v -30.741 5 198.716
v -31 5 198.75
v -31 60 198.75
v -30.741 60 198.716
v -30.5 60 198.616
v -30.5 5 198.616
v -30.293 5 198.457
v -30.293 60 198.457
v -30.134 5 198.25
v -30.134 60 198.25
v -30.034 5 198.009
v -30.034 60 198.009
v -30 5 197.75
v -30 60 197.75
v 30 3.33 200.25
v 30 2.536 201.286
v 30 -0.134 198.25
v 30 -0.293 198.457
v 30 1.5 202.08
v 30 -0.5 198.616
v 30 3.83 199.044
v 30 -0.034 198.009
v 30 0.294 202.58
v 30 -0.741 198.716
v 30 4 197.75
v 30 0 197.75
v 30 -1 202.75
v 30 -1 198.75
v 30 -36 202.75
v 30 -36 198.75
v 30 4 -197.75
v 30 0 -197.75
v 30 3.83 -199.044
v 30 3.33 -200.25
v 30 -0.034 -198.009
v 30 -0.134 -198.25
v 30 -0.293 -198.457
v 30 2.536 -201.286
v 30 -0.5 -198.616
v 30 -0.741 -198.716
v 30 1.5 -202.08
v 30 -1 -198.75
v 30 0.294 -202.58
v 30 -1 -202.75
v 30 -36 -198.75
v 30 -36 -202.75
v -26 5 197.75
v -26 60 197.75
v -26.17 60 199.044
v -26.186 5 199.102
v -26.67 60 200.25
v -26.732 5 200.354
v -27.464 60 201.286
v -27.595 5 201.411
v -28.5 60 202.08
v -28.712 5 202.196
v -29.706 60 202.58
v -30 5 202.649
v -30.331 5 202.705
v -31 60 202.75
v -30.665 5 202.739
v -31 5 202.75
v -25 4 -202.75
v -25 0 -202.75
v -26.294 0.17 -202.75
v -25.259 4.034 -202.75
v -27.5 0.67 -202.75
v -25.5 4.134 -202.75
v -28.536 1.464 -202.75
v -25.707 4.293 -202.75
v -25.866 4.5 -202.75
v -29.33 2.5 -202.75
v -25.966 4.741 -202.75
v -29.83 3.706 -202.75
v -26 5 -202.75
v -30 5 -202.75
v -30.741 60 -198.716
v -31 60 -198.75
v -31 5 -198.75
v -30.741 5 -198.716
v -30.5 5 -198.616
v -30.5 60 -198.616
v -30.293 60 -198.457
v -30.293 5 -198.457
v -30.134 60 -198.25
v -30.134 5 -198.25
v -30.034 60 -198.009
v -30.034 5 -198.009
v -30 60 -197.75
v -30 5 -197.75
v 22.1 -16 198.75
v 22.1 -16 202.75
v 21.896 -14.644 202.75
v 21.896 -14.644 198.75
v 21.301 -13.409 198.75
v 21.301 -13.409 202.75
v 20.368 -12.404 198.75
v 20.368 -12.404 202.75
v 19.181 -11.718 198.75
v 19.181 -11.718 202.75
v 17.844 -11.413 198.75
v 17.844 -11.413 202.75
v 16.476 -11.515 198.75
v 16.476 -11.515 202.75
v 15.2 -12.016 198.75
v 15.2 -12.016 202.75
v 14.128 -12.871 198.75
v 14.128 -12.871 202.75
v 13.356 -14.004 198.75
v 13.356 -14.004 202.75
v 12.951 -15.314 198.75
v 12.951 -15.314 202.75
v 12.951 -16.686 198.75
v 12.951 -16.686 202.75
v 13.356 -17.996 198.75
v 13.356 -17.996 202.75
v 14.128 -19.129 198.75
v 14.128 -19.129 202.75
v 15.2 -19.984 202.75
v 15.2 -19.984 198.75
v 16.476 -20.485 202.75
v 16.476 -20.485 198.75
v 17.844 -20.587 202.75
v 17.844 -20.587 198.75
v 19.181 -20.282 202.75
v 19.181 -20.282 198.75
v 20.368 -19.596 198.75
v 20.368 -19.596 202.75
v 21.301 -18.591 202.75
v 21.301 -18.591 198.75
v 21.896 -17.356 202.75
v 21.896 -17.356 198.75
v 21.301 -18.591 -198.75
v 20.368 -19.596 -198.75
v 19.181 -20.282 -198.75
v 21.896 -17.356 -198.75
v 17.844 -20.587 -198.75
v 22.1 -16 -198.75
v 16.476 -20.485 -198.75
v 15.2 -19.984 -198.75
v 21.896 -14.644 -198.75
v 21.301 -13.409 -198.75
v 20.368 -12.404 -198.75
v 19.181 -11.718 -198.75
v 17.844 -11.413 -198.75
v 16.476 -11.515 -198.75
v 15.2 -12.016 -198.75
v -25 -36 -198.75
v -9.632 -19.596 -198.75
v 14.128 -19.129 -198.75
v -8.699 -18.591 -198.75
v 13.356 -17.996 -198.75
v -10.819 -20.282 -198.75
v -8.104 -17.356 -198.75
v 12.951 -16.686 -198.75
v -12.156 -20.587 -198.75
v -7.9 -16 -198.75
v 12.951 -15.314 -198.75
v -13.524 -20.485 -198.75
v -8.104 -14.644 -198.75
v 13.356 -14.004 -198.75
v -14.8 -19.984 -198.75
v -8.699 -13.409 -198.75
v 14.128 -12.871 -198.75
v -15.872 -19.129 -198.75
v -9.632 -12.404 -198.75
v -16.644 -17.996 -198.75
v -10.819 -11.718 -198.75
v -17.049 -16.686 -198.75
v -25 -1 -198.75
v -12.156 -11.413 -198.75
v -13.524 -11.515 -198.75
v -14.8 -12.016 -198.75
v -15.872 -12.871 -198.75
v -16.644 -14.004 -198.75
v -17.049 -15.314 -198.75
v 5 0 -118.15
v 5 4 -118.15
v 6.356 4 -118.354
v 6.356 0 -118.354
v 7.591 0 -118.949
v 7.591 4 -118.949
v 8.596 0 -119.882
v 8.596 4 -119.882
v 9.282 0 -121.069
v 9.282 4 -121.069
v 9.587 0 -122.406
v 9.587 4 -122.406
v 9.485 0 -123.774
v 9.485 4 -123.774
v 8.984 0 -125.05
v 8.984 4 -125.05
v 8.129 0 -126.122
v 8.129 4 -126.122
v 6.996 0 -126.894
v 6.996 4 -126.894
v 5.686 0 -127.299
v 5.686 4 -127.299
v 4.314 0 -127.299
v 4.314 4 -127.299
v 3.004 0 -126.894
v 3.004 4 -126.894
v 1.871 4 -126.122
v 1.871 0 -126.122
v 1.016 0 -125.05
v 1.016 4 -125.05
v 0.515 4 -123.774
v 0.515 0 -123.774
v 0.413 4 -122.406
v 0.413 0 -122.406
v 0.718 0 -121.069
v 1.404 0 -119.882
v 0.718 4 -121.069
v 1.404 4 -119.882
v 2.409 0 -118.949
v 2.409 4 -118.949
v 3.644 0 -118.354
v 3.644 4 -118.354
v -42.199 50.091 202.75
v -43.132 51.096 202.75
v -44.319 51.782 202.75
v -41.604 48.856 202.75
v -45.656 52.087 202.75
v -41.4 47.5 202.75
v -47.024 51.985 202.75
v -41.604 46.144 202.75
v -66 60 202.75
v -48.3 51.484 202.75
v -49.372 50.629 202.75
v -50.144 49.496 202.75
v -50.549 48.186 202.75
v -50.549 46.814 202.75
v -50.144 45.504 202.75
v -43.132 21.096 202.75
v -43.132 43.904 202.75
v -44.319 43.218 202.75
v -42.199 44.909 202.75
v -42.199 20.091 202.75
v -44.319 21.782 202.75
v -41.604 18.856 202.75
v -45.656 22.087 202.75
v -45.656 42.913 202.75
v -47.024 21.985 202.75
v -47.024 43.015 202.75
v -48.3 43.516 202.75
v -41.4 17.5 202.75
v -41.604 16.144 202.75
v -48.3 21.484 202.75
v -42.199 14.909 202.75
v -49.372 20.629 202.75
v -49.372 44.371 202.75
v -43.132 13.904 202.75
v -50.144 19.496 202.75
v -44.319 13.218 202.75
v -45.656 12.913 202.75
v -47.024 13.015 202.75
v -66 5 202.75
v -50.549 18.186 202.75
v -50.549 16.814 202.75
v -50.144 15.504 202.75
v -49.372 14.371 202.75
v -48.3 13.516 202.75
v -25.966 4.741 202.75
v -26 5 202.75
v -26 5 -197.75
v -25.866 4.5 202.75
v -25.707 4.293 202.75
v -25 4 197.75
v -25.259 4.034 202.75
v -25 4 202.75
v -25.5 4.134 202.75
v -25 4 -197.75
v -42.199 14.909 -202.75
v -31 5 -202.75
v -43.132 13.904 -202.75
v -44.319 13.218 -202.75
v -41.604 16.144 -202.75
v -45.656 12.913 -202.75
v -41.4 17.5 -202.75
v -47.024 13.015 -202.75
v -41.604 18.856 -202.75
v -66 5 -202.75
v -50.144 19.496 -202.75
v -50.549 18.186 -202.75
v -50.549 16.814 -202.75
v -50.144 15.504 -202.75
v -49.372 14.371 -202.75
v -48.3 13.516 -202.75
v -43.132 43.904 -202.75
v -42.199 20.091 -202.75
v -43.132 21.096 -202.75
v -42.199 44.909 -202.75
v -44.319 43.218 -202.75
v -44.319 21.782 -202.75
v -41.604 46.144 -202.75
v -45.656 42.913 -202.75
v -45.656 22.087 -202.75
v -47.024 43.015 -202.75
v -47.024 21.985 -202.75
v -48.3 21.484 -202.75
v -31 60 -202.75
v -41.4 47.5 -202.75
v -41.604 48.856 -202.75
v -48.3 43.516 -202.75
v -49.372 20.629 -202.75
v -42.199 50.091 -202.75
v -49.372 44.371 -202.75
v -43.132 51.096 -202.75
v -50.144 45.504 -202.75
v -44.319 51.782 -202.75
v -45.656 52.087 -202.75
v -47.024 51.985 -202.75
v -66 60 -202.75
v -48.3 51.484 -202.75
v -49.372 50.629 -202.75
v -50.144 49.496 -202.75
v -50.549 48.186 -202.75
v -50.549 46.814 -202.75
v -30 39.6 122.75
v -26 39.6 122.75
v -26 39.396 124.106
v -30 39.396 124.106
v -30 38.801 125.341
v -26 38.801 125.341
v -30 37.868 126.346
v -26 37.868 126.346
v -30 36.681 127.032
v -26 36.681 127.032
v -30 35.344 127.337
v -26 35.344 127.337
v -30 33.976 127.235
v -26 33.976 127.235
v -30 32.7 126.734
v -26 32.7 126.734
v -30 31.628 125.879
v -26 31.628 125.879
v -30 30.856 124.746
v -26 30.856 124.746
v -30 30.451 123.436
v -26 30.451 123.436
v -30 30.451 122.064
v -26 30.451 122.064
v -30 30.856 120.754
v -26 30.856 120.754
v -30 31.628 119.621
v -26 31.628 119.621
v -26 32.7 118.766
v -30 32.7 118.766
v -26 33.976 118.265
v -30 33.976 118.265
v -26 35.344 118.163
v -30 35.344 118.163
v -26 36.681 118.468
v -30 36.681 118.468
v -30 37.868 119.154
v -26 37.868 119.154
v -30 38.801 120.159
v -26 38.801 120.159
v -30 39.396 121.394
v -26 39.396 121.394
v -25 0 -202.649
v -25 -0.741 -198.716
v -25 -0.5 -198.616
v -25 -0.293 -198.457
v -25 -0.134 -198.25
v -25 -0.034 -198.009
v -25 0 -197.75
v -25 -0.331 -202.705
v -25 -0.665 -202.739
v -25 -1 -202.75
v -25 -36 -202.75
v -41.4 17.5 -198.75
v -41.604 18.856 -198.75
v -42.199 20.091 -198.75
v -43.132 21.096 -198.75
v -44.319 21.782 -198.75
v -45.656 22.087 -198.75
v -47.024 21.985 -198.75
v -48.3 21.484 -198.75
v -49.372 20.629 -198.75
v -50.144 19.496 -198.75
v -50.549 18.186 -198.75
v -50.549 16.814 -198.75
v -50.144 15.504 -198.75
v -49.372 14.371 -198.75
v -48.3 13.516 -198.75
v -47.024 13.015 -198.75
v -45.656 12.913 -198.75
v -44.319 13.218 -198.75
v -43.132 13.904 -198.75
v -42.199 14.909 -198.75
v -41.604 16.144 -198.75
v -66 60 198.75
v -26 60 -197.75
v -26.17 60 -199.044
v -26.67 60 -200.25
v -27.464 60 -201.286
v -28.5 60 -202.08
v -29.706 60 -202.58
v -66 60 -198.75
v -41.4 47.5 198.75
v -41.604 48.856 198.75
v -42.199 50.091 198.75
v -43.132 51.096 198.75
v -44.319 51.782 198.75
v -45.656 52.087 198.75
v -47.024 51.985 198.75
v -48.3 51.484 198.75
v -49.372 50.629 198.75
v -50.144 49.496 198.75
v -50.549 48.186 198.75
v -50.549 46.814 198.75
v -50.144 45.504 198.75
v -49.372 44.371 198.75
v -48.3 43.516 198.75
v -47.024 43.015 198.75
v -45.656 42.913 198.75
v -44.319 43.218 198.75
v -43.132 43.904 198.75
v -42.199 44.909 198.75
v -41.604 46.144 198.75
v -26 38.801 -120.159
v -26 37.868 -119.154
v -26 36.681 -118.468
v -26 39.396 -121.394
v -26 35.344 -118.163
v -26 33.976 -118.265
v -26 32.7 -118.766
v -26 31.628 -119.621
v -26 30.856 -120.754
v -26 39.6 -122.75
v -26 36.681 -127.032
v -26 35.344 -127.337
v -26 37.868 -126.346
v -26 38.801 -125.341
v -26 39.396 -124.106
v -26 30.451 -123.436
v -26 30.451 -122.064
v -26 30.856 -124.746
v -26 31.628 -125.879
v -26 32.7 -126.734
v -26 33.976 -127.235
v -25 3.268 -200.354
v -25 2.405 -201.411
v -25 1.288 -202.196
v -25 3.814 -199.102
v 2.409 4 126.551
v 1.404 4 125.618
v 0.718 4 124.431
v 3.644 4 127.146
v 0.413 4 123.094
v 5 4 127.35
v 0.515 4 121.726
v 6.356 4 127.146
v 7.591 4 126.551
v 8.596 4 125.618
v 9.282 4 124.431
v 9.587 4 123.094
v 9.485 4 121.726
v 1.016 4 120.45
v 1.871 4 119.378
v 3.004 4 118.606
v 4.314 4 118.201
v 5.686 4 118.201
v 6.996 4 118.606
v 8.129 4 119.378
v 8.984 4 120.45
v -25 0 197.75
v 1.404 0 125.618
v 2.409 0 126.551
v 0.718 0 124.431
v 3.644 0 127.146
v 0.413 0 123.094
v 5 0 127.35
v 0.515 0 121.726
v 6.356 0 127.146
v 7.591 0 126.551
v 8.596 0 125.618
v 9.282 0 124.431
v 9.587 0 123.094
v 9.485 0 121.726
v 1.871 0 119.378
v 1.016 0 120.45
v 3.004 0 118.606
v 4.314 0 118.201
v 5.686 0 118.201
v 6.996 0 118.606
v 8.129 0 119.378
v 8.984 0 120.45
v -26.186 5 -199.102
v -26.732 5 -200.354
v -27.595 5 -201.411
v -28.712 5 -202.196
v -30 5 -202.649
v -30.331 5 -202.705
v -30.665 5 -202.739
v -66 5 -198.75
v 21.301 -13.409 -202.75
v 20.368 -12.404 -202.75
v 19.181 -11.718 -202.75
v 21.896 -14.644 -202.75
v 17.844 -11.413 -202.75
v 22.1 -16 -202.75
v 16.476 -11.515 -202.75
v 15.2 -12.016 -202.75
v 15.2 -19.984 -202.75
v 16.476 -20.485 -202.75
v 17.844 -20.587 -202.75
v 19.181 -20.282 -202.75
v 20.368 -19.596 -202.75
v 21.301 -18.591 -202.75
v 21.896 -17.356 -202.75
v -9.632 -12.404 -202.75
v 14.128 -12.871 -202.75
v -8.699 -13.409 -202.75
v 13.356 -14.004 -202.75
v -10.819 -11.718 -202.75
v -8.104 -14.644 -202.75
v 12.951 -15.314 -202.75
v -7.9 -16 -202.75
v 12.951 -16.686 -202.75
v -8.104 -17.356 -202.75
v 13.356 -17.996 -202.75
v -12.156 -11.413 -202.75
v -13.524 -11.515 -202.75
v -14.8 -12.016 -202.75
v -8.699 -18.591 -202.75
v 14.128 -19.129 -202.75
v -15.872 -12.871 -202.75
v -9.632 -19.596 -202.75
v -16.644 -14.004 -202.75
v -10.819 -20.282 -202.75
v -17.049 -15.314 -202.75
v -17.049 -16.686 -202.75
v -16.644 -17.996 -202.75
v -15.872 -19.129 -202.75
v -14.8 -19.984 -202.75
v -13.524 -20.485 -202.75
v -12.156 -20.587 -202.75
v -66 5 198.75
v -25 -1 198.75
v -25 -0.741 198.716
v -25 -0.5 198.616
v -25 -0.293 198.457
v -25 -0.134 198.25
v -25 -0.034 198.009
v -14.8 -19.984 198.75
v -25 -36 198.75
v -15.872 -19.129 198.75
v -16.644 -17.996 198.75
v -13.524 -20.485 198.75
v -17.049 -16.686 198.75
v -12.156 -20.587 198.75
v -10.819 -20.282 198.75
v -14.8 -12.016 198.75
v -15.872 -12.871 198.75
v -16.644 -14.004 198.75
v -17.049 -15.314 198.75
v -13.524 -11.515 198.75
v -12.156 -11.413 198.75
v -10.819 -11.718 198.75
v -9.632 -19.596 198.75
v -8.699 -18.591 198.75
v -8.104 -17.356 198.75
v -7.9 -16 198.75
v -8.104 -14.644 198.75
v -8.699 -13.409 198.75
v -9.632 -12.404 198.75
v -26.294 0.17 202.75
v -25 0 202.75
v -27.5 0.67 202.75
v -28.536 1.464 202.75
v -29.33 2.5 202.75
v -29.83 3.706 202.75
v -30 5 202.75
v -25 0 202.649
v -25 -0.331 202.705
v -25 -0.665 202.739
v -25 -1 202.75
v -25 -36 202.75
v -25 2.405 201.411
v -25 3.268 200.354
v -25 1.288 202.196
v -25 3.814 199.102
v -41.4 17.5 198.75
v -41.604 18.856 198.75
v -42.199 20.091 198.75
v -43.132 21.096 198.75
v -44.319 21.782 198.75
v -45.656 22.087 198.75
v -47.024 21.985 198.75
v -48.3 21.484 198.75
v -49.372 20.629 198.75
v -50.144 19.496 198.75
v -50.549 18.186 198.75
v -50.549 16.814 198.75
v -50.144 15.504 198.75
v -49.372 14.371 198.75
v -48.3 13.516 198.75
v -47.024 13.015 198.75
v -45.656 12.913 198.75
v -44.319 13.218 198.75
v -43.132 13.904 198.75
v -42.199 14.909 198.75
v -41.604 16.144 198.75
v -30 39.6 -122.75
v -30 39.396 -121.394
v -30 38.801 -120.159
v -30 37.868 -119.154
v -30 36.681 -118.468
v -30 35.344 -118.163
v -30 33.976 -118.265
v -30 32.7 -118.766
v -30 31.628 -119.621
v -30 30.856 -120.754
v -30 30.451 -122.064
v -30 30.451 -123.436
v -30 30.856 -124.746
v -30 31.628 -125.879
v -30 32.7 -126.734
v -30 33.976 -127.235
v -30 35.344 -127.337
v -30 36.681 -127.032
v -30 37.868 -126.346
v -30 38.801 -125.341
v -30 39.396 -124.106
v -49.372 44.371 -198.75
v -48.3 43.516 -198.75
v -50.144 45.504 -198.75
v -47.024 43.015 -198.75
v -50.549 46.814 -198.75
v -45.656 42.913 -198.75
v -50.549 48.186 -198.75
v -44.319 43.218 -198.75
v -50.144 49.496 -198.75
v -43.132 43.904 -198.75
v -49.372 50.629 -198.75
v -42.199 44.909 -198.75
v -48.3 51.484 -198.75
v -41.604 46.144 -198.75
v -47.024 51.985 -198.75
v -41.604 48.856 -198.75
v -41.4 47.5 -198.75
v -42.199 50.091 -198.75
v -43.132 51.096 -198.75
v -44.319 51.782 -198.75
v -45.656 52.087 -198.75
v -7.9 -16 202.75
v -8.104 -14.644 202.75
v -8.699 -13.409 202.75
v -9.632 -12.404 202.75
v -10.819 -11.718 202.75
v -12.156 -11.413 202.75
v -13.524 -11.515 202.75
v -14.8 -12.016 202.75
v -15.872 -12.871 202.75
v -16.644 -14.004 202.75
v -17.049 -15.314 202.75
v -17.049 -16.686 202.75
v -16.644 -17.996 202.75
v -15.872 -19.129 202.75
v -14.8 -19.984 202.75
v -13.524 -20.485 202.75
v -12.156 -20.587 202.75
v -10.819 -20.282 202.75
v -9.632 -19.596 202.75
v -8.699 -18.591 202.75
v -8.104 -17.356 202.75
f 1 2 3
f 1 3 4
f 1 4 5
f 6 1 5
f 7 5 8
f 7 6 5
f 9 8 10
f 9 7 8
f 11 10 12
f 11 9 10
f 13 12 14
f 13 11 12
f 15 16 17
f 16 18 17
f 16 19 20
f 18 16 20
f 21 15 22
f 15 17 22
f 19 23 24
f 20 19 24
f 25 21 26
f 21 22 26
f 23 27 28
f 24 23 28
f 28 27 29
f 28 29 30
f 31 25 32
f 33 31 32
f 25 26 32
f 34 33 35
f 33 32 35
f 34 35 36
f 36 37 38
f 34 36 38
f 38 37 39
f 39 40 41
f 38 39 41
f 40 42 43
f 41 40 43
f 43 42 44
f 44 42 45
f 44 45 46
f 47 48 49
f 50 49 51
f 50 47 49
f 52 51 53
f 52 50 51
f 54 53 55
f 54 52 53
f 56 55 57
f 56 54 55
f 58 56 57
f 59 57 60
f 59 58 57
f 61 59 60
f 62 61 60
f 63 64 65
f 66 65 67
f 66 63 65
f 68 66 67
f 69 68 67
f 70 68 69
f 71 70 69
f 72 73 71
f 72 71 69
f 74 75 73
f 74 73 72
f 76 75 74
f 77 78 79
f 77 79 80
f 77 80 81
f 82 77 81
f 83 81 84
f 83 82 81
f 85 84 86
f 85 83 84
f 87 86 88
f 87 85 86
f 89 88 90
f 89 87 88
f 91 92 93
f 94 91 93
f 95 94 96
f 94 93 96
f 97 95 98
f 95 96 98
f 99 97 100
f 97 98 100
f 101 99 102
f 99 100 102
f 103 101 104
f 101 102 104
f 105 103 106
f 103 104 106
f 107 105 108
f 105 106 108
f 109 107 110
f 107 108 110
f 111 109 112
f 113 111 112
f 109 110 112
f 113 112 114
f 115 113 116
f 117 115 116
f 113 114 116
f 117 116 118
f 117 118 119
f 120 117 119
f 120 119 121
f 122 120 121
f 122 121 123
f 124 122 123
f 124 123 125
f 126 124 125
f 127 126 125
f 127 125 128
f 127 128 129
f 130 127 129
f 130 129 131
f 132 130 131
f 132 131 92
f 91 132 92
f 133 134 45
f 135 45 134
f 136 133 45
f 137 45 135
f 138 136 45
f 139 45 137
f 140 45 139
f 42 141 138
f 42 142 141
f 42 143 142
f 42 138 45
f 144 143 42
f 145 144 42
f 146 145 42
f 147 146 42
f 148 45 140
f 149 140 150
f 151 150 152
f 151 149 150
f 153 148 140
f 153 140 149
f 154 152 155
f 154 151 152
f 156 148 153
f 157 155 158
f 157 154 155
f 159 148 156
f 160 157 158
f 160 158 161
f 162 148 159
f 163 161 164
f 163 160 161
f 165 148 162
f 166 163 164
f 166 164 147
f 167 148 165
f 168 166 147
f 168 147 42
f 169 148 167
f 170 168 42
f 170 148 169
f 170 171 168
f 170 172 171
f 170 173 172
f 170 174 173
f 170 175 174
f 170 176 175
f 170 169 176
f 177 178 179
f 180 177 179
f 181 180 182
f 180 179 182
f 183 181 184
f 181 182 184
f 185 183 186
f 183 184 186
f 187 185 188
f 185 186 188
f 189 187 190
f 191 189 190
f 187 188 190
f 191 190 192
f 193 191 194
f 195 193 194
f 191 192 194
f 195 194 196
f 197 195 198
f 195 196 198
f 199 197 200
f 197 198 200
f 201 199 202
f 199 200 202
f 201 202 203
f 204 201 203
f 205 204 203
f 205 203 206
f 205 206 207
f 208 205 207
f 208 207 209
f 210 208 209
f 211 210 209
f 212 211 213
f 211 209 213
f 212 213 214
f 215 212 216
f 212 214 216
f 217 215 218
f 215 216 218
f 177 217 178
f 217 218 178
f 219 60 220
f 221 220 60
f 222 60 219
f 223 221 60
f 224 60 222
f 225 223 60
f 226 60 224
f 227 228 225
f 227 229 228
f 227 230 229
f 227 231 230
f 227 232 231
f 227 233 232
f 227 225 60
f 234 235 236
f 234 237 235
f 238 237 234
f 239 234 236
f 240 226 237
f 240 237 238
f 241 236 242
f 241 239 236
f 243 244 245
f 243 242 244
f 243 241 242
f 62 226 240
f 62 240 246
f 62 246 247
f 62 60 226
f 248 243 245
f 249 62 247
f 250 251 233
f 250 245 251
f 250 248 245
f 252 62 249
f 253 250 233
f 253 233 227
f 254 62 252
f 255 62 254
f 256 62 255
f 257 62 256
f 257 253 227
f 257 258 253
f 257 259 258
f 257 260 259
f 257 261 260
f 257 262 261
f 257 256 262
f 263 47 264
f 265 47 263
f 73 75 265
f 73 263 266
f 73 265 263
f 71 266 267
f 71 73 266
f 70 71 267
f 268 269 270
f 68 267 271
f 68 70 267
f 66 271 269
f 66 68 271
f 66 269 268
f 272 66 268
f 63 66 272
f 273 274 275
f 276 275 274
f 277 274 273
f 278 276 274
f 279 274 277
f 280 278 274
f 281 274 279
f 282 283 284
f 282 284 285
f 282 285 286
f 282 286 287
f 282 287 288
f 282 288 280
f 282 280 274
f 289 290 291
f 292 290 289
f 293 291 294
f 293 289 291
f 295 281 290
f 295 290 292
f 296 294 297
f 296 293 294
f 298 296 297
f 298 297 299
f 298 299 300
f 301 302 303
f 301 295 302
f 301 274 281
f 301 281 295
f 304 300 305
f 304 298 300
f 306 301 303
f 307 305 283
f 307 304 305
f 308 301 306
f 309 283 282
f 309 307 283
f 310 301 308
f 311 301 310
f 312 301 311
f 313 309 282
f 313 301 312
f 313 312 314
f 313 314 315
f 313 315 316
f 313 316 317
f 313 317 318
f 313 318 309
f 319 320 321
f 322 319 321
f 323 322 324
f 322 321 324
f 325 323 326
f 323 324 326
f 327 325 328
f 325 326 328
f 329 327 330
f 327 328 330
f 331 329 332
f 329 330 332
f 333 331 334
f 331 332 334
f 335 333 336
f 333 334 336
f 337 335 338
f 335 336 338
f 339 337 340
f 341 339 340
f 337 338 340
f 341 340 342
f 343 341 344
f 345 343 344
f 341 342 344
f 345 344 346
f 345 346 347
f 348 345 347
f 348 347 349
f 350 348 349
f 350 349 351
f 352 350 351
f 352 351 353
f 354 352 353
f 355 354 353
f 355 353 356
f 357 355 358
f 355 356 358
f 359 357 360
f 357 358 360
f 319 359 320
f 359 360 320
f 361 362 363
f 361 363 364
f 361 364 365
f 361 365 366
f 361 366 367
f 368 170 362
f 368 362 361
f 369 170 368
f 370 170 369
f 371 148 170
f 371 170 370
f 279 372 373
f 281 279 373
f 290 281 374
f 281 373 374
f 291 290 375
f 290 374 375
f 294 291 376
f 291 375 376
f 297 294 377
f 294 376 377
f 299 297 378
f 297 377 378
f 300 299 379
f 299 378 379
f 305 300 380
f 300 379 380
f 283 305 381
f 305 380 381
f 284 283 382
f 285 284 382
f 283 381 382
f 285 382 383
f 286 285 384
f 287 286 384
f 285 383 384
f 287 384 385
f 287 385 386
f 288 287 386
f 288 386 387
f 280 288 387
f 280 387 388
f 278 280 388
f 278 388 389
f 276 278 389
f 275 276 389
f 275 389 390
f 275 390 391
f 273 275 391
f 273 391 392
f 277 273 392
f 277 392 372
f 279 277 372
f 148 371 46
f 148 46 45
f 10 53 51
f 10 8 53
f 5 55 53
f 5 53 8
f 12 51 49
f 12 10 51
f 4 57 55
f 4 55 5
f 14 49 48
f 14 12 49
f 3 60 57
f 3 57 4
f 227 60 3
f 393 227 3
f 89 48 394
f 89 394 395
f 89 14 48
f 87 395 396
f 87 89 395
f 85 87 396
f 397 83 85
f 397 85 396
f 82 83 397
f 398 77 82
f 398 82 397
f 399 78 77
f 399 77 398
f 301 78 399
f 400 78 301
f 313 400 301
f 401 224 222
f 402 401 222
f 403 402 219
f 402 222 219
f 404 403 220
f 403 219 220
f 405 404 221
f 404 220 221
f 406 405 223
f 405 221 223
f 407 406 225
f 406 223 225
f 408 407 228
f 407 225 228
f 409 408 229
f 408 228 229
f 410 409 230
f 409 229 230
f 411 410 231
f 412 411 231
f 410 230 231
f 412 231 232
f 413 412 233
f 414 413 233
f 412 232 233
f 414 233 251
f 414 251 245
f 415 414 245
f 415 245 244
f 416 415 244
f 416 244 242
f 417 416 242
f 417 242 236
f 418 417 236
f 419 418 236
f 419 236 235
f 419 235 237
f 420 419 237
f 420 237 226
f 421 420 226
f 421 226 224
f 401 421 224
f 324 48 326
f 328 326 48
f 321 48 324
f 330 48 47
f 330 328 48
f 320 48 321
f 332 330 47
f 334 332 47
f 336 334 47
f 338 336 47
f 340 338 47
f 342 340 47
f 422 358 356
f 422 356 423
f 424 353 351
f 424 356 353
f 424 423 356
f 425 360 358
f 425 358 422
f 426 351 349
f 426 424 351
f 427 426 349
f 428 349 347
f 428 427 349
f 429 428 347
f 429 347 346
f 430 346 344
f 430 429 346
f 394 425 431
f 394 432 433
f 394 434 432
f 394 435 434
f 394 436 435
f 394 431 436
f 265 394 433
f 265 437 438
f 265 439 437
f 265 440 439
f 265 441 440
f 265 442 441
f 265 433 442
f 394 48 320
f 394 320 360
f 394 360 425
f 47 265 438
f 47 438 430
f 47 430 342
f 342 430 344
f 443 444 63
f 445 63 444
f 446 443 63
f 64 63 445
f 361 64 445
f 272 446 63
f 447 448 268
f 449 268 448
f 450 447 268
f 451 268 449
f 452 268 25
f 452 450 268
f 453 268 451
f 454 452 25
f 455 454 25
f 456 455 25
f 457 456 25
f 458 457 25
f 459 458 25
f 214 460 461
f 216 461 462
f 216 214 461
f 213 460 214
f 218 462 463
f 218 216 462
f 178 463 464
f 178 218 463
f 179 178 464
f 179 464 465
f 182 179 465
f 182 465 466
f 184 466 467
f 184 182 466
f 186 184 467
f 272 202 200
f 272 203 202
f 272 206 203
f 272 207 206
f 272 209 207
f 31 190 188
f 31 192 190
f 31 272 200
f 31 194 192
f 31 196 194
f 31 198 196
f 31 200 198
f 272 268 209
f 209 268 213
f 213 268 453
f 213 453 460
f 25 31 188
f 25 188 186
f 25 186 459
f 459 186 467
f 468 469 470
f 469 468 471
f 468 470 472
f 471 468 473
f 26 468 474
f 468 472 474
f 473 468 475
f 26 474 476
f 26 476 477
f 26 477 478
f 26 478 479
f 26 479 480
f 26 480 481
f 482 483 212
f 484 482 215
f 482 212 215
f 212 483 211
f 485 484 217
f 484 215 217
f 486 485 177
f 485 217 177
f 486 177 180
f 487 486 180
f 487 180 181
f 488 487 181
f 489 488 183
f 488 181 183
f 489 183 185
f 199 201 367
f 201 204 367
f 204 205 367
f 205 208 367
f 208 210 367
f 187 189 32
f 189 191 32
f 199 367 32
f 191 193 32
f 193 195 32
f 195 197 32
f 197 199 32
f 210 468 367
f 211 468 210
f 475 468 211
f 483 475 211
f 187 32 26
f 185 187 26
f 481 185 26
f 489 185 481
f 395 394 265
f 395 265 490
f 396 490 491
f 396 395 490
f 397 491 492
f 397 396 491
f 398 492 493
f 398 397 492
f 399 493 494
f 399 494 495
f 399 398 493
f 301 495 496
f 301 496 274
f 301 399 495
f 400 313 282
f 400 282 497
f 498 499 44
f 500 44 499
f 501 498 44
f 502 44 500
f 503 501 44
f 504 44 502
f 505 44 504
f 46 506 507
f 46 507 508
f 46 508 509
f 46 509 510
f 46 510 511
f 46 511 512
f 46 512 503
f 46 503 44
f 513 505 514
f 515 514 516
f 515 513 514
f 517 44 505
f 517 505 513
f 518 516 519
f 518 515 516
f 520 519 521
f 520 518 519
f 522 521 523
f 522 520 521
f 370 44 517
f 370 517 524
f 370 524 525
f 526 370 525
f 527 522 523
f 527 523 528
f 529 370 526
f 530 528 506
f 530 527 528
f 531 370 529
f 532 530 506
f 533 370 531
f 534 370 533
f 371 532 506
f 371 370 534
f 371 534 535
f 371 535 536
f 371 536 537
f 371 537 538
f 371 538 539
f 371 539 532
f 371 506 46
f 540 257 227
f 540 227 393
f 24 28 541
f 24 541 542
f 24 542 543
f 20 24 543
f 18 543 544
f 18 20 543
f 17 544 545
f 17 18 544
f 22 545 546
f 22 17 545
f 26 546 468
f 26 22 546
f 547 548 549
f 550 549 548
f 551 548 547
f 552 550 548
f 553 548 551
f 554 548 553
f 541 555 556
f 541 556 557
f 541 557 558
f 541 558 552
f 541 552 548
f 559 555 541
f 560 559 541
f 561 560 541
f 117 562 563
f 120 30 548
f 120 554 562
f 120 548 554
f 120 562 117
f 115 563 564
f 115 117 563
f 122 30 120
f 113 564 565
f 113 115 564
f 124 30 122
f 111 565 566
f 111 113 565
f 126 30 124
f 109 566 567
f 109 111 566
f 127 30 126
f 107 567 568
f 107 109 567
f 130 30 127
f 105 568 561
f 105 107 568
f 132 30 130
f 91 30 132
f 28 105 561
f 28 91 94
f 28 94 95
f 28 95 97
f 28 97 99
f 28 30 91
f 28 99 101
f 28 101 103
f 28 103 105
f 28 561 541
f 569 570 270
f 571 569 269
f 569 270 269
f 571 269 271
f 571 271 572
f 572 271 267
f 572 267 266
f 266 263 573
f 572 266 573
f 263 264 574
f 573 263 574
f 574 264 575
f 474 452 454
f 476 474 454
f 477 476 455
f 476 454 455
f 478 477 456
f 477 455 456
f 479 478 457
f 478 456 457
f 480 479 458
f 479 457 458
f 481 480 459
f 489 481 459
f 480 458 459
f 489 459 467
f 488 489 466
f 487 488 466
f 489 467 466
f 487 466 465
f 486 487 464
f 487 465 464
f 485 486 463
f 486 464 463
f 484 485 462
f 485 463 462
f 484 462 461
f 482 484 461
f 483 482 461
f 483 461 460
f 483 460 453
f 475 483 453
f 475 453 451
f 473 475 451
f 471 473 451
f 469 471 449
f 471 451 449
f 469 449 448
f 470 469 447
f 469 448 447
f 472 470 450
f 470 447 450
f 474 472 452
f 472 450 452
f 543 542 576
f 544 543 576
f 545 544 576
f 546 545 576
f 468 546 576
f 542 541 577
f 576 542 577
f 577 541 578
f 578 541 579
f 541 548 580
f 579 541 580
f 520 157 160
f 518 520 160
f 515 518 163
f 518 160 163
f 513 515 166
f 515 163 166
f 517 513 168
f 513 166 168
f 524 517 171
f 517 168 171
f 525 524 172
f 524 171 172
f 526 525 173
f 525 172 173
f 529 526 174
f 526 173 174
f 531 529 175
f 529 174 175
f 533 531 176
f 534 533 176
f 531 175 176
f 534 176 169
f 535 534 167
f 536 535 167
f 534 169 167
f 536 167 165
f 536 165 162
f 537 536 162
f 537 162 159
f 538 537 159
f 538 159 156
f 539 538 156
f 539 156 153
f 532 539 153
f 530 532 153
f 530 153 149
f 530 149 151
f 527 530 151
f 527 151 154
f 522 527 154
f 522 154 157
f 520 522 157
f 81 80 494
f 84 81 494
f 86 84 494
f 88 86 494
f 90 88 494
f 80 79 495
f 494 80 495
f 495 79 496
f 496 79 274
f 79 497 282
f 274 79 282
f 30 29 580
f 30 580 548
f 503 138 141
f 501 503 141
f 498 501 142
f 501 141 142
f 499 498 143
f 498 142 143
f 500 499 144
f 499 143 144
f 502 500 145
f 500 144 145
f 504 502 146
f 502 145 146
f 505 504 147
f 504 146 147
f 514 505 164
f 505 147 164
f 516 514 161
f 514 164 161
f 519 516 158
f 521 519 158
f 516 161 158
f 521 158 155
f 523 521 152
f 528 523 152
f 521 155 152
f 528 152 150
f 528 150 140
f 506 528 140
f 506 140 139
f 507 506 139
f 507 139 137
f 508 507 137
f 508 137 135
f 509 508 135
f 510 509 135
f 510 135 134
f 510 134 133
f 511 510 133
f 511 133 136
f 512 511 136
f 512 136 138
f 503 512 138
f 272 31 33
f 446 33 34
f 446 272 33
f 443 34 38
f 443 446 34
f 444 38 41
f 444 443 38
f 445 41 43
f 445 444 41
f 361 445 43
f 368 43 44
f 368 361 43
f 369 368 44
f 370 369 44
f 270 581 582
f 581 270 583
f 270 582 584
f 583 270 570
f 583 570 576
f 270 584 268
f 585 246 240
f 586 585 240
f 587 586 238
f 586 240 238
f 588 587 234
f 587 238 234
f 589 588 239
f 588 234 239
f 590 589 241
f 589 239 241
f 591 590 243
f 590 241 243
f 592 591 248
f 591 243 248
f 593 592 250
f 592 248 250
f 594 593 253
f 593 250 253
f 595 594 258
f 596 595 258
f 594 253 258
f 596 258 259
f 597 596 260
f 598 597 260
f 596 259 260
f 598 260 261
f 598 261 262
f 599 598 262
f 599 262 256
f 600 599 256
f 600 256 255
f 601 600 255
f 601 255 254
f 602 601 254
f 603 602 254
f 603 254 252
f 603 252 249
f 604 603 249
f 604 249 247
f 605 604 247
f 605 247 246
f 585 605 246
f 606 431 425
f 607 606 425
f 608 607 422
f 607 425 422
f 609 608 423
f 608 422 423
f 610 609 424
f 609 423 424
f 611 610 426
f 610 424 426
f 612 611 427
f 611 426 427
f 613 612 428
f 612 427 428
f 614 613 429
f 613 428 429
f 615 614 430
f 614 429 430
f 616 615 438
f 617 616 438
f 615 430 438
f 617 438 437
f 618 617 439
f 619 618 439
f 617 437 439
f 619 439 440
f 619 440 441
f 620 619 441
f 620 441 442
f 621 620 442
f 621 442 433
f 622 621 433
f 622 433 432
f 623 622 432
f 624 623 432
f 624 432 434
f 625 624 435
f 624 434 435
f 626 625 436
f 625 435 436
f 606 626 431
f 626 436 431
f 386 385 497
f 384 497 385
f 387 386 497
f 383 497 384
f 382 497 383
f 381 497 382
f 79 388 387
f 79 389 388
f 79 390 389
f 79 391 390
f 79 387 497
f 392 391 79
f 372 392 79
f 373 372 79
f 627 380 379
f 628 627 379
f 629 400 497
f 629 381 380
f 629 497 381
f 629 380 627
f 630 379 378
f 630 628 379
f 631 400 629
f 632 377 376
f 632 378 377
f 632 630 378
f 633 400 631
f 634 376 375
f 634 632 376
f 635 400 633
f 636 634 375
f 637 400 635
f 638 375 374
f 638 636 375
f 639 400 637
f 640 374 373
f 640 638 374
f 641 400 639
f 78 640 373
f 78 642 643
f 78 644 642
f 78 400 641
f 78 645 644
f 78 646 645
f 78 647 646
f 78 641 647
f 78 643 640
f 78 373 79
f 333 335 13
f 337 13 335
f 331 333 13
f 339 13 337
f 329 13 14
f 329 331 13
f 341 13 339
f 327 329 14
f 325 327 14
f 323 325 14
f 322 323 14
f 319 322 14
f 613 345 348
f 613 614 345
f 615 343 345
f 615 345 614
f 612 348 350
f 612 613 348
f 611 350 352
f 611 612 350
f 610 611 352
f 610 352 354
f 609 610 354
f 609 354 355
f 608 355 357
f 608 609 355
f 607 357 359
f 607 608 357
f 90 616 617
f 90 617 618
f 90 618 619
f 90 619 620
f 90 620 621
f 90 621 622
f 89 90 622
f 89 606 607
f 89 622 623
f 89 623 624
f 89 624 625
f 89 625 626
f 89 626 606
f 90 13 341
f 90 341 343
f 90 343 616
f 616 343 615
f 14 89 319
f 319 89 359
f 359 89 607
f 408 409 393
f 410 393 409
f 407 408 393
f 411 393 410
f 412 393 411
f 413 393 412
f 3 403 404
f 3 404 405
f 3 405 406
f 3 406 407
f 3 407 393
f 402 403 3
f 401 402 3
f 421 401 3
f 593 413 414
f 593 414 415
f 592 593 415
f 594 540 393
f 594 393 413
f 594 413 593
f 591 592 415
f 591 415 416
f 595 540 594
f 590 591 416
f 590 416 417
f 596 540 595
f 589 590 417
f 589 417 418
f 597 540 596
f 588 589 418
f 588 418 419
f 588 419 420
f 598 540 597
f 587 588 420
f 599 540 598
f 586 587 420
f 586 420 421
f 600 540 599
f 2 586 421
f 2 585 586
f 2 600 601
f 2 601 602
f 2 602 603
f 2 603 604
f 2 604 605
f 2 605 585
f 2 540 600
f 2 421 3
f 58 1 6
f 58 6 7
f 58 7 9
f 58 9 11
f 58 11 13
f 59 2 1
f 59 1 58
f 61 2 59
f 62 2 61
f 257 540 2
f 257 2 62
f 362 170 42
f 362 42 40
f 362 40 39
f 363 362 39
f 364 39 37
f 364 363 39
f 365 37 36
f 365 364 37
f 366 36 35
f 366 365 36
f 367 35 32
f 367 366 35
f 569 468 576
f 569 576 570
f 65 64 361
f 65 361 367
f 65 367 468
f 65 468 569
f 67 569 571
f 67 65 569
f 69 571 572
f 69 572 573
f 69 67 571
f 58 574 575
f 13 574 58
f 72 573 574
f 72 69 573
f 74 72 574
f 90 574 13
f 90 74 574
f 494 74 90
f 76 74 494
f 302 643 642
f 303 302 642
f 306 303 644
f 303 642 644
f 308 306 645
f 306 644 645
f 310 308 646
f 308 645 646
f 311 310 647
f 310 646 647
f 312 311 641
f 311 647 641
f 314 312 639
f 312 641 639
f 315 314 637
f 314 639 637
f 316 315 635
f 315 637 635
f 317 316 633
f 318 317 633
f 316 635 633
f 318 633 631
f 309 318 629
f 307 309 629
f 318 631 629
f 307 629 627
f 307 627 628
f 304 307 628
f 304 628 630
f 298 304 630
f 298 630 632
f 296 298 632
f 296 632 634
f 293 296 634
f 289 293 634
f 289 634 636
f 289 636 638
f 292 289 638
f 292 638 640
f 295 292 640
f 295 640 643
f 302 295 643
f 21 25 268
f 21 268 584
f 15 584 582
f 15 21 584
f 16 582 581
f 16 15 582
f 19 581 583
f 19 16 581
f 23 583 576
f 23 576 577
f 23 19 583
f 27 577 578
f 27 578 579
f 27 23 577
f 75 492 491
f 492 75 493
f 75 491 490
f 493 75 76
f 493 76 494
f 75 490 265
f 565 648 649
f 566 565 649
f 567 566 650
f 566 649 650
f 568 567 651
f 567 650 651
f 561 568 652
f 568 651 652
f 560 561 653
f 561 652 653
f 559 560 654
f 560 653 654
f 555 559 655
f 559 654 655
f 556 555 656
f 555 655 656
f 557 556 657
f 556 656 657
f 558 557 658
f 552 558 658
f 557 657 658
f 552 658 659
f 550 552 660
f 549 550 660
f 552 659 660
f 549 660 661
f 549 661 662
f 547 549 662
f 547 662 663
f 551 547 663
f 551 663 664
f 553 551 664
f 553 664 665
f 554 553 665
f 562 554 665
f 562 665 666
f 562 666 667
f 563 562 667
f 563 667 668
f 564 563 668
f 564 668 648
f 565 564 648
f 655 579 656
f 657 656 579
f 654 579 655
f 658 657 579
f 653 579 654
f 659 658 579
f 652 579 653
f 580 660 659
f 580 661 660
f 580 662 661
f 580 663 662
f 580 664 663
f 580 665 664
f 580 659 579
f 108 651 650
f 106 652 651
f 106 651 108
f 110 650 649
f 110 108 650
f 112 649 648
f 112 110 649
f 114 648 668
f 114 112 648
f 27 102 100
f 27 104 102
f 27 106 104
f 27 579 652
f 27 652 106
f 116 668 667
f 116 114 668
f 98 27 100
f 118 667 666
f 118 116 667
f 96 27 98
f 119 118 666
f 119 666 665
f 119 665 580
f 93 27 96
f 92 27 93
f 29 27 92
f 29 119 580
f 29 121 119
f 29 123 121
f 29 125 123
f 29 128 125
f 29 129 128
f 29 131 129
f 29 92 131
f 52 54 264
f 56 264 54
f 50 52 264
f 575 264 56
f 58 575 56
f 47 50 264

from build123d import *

# Parameters (mm, degrees)
SKETCH1_W                      = 60
SKETCH1_H                      = 405.5
BASE_FLANGE1_DEPTH             = 4
EDGE_FLANGE1_STRIP_W           = 18
EDGE_FLANGE1_STRIP_H           = 4
EDGE_FLANGE1_STRIP_CUT_DEPTH   = 405.5
EDGE_FLANGE1_DEPTH             = 405.5
EDGE_FLANGE2_STRIP_W           = 18
EDGE_FLANGE2_STRIP_H           = 4
EDGE_FLANGE2_STRIP_CUT_DEPTH   = 55
EDGE_FLANGE2_STRIP_2_W         = 18
EDGE_FLANGE2_STRIP_2_H         = 4
EDGE_FLANGE2_STRIP_CUT_2_DEPTH = 55
EDGE_FLANGE2_STRIP_3_W         = 18
EDGE_FLANGE2_STRIP_3_H         = 4
EDGE_FLANGE2_STRIP_CUT_3_DEPTH = 55
EDGE_FLANGE2_STRIP_4_W         = 18
EDGE_FLANGE2_STRIP_4_H         = 4
EDGE_FLANGE2_STRIP_CUT_4_DEPTH = 55
EDGE_FLANGE2_DEPTH             = 55
EDGE_FLANGE2_BEND_DEPTH        = 55
EDGE_FLANGE2_BEND_2_DEPTH      = 55
EDGE_FLANGE2_BEND_3_DEPTH      = 55
SKETCH18_R                     = 4.6
EXTRUDE1_DEPTH                 = 416.194231655
SKETCH19_R                     = 4.6
EXTRUDE2_DEPTH                 = 4
SKETCH20_R                     = 4.6
EXTRUDE3_DEPTH                 = 4


# Sheet-metal steps are written as plain solids
with BuildPart() as part:
    # Sketch1 → Base-Flange1 (new body)
    with BuildSketch(Plane(origin=(0, 0, 0), x_dir=(1, 0, 0), z_dir=(0, 1, 0))):
        Rectangle(SKETCH1_W, SKETCH1_H)
    extrude(amount=BASE_FLANGE1_DEPTH)

    # Edge-Flange1 strip (across the edge) → Edge-Flange1 strip cut (cut)
    with BuildSketch(Plane(origin=(-30, 4, -202.75), x_dir=(1, 0, 0), z_dir=(0, 0, 1))):
        with Locations((-4, -2)):
            Rectangle(EDGE_FLANGE1_STRIP_W, EDGE_FLANGE1_STRIP_H)
    extrude(amount=EDGE_FLANGE1_STRIP_CUT_DEPTH, mode=Mode.SUBTRACT)

    # Edge-Flange1 section (across the edge) → Edge-Flange1 (add)
    with BuildSketch(Plane(origin=(-30, 4, -202.75), x_dir=(1, 0, 0), z_dir=(0, 0, 1))):
        with BuildLine():
            Line((0, 1), (0, 56))
            Line((0, 56), (4, 56))
            Line((4, 56), (4, 1))
            ThreePointArc((4, 1), (4.292893219, 0.292893219), (5, 0))
            Line((5, 0), (5, -4))
            ThreePointArc((5, -4), (1.464466094, -2.535533906), (0, 1))
        make_face()
    extrude(amount=EDGE_FLANGE1_DEPTH)

    # Edge-Flange2 strip (across the edge) → Edge-Flange2 strip cut (cut)
    with BuildSketch(Plane(origin=(-30, 5, 202.75), x_dir=(0, 0, -1), z_dir=(0, 1, 0))):
        with Locations((-4, -2)):
            Rectangle(EDGE_FLANGE2_STRIP_W, EDGE_FLANGE2_STRIP_H)
    extrude(amount=EDGE_FLANGE2_STRIP_CUT_DEPTH, mode=Mode.SUBTRACT)

    # Edge-Flange2 strip 2 (across the edge) → Edge-Flange2 strip cut 2 (cut)
    with BuildSketch(Plane(origin=(30, 0, 202.75), x_dir=(0, 0, -1), z_dir=(-1, 0, 0))):
        with Locations((-4, -2)):
            Rectangle(EDGE_FLANGE2_STRIP_2_W, EDGE_FLANGE2_STRIP_2_H)
    extrude(amount=EDGE_FLANGE2_STRIP_CUT_2_DEPTH, mode=Mode.SUBTRACT)

    # Edge-Flange2 strip 3 (across the edge) → Edge-Flange2 strip cut 3 (cut)
    with BuildSketch(Plane(origin=(-30, 60, -202.75), x_dir=(0, 0, 1), z_dir=(0, -1, 0))):
        with Locations((-4, -2)):
            Rectangle(EDGE_FLANGE2_STRIP_3_W, EDGE_FLANGE2_STRIP_3_H)
    extrude(amount=EDGE_FLANGE2_STRIP_CUT_3_DEPTH, mode=Mode.SUBTRACT)

    # Edge-Flange2 strip 4 (across the edge) → Edge-Flange2 strip cut 4 (cut)
    with BuildSketch(Plane(origin=(-25, 0, -202.75), x_dir=(0, 0, 1), z_dir=(1, 0, 0))):
        with Locations((-4, -2)):
            Rectangle(EDGE_FLANGE2_STRIP_4_W, EDGE_FLANGE2_STRIP_4_H)
    extrude(amount=EDGE_FLANGE2_STRIP_CUT_4_DEPTH, mode=Mode.SUBTRACT)

    # Edge-Flange2 section (across the edge) → Edge-Flange2 (add)
    with BuildSketch(Plane(origin=(-30, 5, 202.75), x_dir=(0, 0, -1), z_dir=(0, 1, 0))):
        with BuildLine():
            Line((0, 1), (0, 36))
            Line((0, 36), (4, 36))
            Line((4, 36), (4, 1))
            ThreePointArc((4, 1), (4.292893219, 0.292893219), (5, 0))
            Line((5, 0), (5, -4))
            ThreePointArc((5, -4), (1.464466094, -2.535533906), (0, 1))
        make_face()
    extrude(amount=EDGE_FLANGE2_DEPTH)

    # Edge-Flange2 section 2 (across the edge) → Edge-Flange2 bend (add)
    with BuildSketch(Plane(origin=(30, 0, 202.75), x_dir=(0, 0, -1), z_dir=(-1, 0, 0))):
        with BuildLine():
            Line((0, 1), (0, 36))
            Line((0, 36), (4, 36))
            Line((4, 36), (4, 1))
            ThreePointArc((4, 1), (4.292893219, 0.292893219), (5, 0))
            Line((5, 0), (5, -4))
            ThreePointArc((5, -4), (1.464466094, -2.535533906), (0, 1))
        make_face()
    extrude(amount=EDGE_FLANGE2_BEND_DEPTH)

    # Edge-Flange2 section 3 (across the edge) → Edge-Flange2 bend 2 (add)
    with BuildSketch(Plane(origin=(-30, 60, -202.75), x_dir=(0, 0, 1), z_dir=(0, -1, 0))):
        with BuildLine():
            Line((0, 1), (0, 36))
            Line((0, 36), (4, 36))
            Line((4, 36), (4, 1))
            ThreePointArc((4, 1), (4.292893219, 0.292893219), (5, 0))
            Line((5, 0), (5, -4))
            ThreePointArc((5, -4), (1.464466094, -2.535533906), (0, 1))
        make_face()
    extrude(amount=EDGE_FLANGE2_BEND_2_DEPTH)

    # Edge-Flange2 section 4 (across the edge) → Edge-Flange2 bend 3 (add)
    with BuildSketch(Plane(origin=(-25, 0, -202.75), x_dir=(0, 0, 1), z_dir=(1, 0, 0))):
        with BuildLine():
            Line((0, 1), (0, 36))
            Line((0, 36), (4, 36))
            Line((4, 36), (4, 1))
            ThreePointArc((4, 1), (4.292893219, 0.292893219), (5, 0))
            Line((5, 0), (5, -4))
            ThreePointArc((5, -4), (1.464466094, -2.535533906), (0, 1))
        make_face()
    extrude(amount=EDGE_FLANGE2_BEND_3_DEPTH)

    # Sketch18 → Extrude1 (cut, through all)
    with BuildSketch(Plane.XY.offset(202.75)):
        with Locations((-46, 47.5)):
            Circle(SKETCH18_R)
        with Locations((-46, 17.5)):
            Circle(SKETCH18_R)
        with Locations((-12.5, -16)):
            Circle(SKETCH18_R)
        with Locations((17.5, -16)):
            Circle(SKETCH18_R)
    extrude(amount=-EXTRUDE1_DEPTH, mode=Mode.SUBTRACT)

    # Sketch19 → Extrude2 (cut)
    with BuildSketch(Plane(origin=(-26, 0, 0), x_dir=(0, 0, -1), z_dir=(1, 0, 0))):
        with Locations(Location((-122.75, 35, 0), (0, 0, 90))):
            Circle(SKETCH19_R)
        with Locations(Location((122.75, 35, 0), (0, 0, 90))):
            Circle(SKETCH19_R)
    extrude(amount=-EXTRUDE2_DEPTH, mode=Mode.SUBTRACT)

    # Sketch20 → Extrude3 (cut)
    with BuildSketch(Plane(origin=(0, 4, 0), x_dir=(1, 0, 0), z_dir=(0, 1, 0))):
        with Locations(Location((5, 122.75, 0), (0, 0, 270))):
            Circle(SKETCH20_R)
        with Locations(Location((5, -122.75, 0), (0, 0, 270))):
            Circle(SKETCH20_R)
    extrude(amount=-EXTRUDE3_DEPTH, mode=Mode.SUBTRACT)


solid = part.part
